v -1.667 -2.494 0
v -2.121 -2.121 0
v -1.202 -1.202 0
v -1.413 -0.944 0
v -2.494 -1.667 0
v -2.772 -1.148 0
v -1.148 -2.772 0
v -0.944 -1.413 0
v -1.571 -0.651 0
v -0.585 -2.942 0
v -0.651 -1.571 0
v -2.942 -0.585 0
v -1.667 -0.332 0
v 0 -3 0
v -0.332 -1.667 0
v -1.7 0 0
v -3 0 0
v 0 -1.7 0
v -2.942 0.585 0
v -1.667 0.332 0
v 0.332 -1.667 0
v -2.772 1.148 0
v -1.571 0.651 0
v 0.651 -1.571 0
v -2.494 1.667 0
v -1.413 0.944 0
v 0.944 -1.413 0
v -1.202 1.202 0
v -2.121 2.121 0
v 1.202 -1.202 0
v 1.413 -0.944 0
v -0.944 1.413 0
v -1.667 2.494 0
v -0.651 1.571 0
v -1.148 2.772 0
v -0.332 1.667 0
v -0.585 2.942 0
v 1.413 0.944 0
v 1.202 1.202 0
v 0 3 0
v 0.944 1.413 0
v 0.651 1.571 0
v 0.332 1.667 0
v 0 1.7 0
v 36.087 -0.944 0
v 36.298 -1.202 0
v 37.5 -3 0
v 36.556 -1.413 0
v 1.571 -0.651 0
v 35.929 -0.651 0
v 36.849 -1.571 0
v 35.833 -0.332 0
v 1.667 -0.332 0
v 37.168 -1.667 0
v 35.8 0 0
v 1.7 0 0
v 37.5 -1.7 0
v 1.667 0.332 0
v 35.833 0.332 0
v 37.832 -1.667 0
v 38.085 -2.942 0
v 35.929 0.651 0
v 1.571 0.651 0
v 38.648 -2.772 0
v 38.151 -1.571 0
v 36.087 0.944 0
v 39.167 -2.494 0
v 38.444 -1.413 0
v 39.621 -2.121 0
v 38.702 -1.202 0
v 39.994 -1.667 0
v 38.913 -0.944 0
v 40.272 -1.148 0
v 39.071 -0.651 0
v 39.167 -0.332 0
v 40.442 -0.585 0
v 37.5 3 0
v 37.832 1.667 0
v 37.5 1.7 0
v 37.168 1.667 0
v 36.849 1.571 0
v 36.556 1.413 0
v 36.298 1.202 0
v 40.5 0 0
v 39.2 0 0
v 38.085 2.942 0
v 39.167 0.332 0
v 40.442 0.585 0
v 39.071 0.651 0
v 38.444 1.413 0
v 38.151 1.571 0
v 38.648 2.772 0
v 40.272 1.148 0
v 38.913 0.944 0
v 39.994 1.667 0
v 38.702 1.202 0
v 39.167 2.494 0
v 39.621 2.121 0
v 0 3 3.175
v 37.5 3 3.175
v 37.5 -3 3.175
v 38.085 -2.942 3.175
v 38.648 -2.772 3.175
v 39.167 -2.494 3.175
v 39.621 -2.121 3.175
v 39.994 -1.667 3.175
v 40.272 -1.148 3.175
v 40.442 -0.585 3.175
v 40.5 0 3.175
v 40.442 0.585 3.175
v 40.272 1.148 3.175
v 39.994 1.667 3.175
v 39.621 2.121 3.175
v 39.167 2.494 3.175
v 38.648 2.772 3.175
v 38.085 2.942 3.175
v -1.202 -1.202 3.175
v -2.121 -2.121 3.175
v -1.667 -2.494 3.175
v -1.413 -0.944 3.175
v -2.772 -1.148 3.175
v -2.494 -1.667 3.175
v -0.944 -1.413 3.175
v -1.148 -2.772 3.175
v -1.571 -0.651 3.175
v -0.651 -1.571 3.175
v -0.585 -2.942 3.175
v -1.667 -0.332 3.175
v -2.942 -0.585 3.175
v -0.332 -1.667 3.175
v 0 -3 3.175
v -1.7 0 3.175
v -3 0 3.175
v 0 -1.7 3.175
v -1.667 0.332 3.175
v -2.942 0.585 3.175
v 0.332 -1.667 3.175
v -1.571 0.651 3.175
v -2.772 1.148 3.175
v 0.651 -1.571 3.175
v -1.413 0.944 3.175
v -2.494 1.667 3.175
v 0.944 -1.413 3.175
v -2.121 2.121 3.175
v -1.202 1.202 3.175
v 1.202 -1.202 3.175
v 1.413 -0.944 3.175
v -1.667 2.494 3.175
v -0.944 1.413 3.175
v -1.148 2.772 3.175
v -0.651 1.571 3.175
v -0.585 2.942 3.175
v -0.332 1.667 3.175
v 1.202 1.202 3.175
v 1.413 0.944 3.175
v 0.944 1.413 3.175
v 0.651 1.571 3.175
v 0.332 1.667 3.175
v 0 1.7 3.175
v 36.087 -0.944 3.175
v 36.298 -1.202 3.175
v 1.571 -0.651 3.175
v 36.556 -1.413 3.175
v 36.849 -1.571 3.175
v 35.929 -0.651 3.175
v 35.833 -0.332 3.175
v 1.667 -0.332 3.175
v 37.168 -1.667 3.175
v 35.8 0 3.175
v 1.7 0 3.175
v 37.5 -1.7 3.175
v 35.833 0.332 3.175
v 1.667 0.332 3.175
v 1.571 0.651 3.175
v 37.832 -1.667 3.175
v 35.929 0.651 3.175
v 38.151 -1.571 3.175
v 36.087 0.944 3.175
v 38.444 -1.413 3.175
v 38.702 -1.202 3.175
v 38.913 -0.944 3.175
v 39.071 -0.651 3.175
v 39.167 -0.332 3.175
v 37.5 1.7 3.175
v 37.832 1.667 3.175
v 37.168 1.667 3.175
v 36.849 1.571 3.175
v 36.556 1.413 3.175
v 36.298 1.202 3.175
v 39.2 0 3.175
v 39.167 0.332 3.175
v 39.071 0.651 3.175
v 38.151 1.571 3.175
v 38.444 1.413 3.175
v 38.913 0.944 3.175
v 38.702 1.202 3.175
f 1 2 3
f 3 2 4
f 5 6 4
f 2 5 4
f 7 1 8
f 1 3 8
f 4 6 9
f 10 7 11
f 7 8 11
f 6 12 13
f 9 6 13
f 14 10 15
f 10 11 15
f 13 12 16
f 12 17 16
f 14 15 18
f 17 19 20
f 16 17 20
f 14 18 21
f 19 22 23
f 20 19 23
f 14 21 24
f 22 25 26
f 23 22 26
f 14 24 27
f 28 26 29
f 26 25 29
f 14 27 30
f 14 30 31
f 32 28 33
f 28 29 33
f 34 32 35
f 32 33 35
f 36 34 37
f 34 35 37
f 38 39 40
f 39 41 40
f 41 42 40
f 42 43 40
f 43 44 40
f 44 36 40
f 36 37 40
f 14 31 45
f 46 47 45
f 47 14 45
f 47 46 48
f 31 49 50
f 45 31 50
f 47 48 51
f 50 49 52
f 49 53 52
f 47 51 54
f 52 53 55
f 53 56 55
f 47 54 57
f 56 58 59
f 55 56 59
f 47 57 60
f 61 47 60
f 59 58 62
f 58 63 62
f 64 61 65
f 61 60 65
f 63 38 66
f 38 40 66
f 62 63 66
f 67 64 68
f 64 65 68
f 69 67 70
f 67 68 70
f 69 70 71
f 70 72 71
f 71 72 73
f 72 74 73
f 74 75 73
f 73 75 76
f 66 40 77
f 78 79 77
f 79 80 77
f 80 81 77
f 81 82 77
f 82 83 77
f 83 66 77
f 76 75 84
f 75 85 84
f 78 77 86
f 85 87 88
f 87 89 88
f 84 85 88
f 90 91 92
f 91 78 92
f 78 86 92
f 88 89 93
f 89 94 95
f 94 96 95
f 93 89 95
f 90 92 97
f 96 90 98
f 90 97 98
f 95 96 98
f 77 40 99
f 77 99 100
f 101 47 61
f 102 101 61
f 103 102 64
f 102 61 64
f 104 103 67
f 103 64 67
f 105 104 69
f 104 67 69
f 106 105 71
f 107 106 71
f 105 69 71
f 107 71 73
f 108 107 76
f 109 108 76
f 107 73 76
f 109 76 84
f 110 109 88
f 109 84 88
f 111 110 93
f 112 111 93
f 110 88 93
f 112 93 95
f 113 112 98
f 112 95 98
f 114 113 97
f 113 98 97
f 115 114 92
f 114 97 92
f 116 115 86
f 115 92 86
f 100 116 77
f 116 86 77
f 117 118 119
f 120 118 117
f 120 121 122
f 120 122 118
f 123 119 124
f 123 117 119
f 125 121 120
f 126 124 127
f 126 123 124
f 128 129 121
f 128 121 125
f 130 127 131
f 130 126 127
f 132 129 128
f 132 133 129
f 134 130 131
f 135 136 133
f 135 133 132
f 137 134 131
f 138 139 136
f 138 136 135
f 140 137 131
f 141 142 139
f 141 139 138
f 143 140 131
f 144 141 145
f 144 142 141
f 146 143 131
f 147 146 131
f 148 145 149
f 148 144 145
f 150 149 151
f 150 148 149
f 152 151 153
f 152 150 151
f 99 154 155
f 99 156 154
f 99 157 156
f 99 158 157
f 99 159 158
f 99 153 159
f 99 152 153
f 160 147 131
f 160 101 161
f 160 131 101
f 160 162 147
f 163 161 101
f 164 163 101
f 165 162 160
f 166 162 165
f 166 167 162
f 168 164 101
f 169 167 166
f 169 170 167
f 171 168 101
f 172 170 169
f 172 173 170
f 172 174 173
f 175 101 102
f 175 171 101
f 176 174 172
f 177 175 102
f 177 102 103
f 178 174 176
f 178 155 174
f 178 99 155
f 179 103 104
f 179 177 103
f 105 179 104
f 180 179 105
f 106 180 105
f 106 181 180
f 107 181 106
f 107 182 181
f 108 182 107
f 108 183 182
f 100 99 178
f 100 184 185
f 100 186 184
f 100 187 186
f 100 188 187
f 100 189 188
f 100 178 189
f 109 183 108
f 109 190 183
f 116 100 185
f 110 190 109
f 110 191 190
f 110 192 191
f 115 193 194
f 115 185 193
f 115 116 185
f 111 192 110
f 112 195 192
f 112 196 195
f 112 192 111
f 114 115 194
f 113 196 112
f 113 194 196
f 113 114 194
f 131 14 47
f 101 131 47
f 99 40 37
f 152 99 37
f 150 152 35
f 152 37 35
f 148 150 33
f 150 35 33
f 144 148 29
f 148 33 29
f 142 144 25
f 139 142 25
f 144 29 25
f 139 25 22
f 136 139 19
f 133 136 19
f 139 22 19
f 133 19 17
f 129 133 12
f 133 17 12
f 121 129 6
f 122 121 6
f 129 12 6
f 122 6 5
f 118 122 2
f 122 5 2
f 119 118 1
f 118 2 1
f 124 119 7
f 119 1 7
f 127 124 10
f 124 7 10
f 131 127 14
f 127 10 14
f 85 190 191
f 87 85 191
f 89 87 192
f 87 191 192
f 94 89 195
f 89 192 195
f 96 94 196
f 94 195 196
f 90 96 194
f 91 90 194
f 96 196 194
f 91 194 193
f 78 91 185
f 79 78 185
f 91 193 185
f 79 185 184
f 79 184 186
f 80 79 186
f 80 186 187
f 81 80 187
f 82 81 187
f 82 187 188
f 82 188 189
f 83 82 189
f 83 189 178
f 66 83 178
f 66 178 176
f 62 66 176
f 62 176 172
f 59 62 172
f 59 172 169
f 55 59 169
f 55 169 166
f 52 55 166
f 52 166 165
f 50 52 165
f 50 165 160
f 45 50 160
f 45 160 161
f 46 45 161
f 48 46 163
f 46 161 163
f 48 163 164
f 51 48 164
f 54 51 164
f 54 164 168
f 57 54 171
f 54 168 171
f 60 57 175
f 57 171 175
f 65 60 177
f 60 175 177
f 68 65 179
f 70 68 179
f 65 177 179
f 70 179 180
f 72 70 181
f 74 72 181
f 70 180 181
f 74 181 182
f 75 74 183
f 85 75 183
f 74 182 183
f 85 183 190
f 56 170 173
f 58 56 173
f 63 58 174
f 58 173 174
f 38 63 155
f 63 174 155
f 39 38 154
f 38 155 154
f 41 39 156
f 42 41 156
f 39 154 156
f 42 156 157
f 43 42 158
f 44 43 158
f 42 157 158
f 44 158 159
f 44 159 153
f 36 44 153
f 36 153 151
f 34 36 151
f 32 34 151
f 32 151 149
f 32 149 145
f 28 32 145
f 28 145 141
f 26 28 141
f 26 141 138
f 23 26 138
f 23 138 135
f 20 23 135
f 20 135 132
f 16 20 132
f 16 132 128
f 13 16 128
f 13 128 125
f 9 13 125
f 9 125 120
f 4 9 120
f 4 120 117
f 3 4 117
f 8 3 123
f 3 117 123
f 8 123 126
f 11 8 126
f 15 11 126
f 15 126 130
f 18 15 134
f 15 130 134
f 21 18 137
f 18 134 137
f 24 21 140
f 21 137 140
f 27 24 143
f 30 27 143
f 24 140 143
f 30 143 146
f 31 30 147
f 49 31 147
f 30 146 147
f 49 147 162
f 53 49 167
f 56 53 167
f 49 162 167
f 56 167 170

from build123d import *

# Parameters (mm, degrees)
PAD_DEPTH   = 3.175
SKETCH001_R = 1.7
HOLE_DEPTH  = 3.176


with BuildPart() as part:
    # Sketch → Pad (new body)
    with BuildSketch(Plane.XY):
        with BuildLine():
            ThreePointArc((0, 3), (-3, 0), (0, -3))
            Line((0, -3), (37.5, -3))
            ThreePointArc((37.5, -3), (40.5, 0), (37.5, 3))
            Line((0, 3), (37.5, 3))
        make_face()
    extrude(amount=PAD_DEPTH)

    # Sketch001 (on Face6 of Pad) → Hole (cut, through all)
    with BuildSketch(Plane.XY.offset(3.175)):
        Circle(SKETCH001_R)
        with Locations((37.5, 0)):
            Circle(SKETCH001_R)
    extrude(amount=-HOLE_DEPTH, mode=Mode.SUBTRACT)


solid = part.part
